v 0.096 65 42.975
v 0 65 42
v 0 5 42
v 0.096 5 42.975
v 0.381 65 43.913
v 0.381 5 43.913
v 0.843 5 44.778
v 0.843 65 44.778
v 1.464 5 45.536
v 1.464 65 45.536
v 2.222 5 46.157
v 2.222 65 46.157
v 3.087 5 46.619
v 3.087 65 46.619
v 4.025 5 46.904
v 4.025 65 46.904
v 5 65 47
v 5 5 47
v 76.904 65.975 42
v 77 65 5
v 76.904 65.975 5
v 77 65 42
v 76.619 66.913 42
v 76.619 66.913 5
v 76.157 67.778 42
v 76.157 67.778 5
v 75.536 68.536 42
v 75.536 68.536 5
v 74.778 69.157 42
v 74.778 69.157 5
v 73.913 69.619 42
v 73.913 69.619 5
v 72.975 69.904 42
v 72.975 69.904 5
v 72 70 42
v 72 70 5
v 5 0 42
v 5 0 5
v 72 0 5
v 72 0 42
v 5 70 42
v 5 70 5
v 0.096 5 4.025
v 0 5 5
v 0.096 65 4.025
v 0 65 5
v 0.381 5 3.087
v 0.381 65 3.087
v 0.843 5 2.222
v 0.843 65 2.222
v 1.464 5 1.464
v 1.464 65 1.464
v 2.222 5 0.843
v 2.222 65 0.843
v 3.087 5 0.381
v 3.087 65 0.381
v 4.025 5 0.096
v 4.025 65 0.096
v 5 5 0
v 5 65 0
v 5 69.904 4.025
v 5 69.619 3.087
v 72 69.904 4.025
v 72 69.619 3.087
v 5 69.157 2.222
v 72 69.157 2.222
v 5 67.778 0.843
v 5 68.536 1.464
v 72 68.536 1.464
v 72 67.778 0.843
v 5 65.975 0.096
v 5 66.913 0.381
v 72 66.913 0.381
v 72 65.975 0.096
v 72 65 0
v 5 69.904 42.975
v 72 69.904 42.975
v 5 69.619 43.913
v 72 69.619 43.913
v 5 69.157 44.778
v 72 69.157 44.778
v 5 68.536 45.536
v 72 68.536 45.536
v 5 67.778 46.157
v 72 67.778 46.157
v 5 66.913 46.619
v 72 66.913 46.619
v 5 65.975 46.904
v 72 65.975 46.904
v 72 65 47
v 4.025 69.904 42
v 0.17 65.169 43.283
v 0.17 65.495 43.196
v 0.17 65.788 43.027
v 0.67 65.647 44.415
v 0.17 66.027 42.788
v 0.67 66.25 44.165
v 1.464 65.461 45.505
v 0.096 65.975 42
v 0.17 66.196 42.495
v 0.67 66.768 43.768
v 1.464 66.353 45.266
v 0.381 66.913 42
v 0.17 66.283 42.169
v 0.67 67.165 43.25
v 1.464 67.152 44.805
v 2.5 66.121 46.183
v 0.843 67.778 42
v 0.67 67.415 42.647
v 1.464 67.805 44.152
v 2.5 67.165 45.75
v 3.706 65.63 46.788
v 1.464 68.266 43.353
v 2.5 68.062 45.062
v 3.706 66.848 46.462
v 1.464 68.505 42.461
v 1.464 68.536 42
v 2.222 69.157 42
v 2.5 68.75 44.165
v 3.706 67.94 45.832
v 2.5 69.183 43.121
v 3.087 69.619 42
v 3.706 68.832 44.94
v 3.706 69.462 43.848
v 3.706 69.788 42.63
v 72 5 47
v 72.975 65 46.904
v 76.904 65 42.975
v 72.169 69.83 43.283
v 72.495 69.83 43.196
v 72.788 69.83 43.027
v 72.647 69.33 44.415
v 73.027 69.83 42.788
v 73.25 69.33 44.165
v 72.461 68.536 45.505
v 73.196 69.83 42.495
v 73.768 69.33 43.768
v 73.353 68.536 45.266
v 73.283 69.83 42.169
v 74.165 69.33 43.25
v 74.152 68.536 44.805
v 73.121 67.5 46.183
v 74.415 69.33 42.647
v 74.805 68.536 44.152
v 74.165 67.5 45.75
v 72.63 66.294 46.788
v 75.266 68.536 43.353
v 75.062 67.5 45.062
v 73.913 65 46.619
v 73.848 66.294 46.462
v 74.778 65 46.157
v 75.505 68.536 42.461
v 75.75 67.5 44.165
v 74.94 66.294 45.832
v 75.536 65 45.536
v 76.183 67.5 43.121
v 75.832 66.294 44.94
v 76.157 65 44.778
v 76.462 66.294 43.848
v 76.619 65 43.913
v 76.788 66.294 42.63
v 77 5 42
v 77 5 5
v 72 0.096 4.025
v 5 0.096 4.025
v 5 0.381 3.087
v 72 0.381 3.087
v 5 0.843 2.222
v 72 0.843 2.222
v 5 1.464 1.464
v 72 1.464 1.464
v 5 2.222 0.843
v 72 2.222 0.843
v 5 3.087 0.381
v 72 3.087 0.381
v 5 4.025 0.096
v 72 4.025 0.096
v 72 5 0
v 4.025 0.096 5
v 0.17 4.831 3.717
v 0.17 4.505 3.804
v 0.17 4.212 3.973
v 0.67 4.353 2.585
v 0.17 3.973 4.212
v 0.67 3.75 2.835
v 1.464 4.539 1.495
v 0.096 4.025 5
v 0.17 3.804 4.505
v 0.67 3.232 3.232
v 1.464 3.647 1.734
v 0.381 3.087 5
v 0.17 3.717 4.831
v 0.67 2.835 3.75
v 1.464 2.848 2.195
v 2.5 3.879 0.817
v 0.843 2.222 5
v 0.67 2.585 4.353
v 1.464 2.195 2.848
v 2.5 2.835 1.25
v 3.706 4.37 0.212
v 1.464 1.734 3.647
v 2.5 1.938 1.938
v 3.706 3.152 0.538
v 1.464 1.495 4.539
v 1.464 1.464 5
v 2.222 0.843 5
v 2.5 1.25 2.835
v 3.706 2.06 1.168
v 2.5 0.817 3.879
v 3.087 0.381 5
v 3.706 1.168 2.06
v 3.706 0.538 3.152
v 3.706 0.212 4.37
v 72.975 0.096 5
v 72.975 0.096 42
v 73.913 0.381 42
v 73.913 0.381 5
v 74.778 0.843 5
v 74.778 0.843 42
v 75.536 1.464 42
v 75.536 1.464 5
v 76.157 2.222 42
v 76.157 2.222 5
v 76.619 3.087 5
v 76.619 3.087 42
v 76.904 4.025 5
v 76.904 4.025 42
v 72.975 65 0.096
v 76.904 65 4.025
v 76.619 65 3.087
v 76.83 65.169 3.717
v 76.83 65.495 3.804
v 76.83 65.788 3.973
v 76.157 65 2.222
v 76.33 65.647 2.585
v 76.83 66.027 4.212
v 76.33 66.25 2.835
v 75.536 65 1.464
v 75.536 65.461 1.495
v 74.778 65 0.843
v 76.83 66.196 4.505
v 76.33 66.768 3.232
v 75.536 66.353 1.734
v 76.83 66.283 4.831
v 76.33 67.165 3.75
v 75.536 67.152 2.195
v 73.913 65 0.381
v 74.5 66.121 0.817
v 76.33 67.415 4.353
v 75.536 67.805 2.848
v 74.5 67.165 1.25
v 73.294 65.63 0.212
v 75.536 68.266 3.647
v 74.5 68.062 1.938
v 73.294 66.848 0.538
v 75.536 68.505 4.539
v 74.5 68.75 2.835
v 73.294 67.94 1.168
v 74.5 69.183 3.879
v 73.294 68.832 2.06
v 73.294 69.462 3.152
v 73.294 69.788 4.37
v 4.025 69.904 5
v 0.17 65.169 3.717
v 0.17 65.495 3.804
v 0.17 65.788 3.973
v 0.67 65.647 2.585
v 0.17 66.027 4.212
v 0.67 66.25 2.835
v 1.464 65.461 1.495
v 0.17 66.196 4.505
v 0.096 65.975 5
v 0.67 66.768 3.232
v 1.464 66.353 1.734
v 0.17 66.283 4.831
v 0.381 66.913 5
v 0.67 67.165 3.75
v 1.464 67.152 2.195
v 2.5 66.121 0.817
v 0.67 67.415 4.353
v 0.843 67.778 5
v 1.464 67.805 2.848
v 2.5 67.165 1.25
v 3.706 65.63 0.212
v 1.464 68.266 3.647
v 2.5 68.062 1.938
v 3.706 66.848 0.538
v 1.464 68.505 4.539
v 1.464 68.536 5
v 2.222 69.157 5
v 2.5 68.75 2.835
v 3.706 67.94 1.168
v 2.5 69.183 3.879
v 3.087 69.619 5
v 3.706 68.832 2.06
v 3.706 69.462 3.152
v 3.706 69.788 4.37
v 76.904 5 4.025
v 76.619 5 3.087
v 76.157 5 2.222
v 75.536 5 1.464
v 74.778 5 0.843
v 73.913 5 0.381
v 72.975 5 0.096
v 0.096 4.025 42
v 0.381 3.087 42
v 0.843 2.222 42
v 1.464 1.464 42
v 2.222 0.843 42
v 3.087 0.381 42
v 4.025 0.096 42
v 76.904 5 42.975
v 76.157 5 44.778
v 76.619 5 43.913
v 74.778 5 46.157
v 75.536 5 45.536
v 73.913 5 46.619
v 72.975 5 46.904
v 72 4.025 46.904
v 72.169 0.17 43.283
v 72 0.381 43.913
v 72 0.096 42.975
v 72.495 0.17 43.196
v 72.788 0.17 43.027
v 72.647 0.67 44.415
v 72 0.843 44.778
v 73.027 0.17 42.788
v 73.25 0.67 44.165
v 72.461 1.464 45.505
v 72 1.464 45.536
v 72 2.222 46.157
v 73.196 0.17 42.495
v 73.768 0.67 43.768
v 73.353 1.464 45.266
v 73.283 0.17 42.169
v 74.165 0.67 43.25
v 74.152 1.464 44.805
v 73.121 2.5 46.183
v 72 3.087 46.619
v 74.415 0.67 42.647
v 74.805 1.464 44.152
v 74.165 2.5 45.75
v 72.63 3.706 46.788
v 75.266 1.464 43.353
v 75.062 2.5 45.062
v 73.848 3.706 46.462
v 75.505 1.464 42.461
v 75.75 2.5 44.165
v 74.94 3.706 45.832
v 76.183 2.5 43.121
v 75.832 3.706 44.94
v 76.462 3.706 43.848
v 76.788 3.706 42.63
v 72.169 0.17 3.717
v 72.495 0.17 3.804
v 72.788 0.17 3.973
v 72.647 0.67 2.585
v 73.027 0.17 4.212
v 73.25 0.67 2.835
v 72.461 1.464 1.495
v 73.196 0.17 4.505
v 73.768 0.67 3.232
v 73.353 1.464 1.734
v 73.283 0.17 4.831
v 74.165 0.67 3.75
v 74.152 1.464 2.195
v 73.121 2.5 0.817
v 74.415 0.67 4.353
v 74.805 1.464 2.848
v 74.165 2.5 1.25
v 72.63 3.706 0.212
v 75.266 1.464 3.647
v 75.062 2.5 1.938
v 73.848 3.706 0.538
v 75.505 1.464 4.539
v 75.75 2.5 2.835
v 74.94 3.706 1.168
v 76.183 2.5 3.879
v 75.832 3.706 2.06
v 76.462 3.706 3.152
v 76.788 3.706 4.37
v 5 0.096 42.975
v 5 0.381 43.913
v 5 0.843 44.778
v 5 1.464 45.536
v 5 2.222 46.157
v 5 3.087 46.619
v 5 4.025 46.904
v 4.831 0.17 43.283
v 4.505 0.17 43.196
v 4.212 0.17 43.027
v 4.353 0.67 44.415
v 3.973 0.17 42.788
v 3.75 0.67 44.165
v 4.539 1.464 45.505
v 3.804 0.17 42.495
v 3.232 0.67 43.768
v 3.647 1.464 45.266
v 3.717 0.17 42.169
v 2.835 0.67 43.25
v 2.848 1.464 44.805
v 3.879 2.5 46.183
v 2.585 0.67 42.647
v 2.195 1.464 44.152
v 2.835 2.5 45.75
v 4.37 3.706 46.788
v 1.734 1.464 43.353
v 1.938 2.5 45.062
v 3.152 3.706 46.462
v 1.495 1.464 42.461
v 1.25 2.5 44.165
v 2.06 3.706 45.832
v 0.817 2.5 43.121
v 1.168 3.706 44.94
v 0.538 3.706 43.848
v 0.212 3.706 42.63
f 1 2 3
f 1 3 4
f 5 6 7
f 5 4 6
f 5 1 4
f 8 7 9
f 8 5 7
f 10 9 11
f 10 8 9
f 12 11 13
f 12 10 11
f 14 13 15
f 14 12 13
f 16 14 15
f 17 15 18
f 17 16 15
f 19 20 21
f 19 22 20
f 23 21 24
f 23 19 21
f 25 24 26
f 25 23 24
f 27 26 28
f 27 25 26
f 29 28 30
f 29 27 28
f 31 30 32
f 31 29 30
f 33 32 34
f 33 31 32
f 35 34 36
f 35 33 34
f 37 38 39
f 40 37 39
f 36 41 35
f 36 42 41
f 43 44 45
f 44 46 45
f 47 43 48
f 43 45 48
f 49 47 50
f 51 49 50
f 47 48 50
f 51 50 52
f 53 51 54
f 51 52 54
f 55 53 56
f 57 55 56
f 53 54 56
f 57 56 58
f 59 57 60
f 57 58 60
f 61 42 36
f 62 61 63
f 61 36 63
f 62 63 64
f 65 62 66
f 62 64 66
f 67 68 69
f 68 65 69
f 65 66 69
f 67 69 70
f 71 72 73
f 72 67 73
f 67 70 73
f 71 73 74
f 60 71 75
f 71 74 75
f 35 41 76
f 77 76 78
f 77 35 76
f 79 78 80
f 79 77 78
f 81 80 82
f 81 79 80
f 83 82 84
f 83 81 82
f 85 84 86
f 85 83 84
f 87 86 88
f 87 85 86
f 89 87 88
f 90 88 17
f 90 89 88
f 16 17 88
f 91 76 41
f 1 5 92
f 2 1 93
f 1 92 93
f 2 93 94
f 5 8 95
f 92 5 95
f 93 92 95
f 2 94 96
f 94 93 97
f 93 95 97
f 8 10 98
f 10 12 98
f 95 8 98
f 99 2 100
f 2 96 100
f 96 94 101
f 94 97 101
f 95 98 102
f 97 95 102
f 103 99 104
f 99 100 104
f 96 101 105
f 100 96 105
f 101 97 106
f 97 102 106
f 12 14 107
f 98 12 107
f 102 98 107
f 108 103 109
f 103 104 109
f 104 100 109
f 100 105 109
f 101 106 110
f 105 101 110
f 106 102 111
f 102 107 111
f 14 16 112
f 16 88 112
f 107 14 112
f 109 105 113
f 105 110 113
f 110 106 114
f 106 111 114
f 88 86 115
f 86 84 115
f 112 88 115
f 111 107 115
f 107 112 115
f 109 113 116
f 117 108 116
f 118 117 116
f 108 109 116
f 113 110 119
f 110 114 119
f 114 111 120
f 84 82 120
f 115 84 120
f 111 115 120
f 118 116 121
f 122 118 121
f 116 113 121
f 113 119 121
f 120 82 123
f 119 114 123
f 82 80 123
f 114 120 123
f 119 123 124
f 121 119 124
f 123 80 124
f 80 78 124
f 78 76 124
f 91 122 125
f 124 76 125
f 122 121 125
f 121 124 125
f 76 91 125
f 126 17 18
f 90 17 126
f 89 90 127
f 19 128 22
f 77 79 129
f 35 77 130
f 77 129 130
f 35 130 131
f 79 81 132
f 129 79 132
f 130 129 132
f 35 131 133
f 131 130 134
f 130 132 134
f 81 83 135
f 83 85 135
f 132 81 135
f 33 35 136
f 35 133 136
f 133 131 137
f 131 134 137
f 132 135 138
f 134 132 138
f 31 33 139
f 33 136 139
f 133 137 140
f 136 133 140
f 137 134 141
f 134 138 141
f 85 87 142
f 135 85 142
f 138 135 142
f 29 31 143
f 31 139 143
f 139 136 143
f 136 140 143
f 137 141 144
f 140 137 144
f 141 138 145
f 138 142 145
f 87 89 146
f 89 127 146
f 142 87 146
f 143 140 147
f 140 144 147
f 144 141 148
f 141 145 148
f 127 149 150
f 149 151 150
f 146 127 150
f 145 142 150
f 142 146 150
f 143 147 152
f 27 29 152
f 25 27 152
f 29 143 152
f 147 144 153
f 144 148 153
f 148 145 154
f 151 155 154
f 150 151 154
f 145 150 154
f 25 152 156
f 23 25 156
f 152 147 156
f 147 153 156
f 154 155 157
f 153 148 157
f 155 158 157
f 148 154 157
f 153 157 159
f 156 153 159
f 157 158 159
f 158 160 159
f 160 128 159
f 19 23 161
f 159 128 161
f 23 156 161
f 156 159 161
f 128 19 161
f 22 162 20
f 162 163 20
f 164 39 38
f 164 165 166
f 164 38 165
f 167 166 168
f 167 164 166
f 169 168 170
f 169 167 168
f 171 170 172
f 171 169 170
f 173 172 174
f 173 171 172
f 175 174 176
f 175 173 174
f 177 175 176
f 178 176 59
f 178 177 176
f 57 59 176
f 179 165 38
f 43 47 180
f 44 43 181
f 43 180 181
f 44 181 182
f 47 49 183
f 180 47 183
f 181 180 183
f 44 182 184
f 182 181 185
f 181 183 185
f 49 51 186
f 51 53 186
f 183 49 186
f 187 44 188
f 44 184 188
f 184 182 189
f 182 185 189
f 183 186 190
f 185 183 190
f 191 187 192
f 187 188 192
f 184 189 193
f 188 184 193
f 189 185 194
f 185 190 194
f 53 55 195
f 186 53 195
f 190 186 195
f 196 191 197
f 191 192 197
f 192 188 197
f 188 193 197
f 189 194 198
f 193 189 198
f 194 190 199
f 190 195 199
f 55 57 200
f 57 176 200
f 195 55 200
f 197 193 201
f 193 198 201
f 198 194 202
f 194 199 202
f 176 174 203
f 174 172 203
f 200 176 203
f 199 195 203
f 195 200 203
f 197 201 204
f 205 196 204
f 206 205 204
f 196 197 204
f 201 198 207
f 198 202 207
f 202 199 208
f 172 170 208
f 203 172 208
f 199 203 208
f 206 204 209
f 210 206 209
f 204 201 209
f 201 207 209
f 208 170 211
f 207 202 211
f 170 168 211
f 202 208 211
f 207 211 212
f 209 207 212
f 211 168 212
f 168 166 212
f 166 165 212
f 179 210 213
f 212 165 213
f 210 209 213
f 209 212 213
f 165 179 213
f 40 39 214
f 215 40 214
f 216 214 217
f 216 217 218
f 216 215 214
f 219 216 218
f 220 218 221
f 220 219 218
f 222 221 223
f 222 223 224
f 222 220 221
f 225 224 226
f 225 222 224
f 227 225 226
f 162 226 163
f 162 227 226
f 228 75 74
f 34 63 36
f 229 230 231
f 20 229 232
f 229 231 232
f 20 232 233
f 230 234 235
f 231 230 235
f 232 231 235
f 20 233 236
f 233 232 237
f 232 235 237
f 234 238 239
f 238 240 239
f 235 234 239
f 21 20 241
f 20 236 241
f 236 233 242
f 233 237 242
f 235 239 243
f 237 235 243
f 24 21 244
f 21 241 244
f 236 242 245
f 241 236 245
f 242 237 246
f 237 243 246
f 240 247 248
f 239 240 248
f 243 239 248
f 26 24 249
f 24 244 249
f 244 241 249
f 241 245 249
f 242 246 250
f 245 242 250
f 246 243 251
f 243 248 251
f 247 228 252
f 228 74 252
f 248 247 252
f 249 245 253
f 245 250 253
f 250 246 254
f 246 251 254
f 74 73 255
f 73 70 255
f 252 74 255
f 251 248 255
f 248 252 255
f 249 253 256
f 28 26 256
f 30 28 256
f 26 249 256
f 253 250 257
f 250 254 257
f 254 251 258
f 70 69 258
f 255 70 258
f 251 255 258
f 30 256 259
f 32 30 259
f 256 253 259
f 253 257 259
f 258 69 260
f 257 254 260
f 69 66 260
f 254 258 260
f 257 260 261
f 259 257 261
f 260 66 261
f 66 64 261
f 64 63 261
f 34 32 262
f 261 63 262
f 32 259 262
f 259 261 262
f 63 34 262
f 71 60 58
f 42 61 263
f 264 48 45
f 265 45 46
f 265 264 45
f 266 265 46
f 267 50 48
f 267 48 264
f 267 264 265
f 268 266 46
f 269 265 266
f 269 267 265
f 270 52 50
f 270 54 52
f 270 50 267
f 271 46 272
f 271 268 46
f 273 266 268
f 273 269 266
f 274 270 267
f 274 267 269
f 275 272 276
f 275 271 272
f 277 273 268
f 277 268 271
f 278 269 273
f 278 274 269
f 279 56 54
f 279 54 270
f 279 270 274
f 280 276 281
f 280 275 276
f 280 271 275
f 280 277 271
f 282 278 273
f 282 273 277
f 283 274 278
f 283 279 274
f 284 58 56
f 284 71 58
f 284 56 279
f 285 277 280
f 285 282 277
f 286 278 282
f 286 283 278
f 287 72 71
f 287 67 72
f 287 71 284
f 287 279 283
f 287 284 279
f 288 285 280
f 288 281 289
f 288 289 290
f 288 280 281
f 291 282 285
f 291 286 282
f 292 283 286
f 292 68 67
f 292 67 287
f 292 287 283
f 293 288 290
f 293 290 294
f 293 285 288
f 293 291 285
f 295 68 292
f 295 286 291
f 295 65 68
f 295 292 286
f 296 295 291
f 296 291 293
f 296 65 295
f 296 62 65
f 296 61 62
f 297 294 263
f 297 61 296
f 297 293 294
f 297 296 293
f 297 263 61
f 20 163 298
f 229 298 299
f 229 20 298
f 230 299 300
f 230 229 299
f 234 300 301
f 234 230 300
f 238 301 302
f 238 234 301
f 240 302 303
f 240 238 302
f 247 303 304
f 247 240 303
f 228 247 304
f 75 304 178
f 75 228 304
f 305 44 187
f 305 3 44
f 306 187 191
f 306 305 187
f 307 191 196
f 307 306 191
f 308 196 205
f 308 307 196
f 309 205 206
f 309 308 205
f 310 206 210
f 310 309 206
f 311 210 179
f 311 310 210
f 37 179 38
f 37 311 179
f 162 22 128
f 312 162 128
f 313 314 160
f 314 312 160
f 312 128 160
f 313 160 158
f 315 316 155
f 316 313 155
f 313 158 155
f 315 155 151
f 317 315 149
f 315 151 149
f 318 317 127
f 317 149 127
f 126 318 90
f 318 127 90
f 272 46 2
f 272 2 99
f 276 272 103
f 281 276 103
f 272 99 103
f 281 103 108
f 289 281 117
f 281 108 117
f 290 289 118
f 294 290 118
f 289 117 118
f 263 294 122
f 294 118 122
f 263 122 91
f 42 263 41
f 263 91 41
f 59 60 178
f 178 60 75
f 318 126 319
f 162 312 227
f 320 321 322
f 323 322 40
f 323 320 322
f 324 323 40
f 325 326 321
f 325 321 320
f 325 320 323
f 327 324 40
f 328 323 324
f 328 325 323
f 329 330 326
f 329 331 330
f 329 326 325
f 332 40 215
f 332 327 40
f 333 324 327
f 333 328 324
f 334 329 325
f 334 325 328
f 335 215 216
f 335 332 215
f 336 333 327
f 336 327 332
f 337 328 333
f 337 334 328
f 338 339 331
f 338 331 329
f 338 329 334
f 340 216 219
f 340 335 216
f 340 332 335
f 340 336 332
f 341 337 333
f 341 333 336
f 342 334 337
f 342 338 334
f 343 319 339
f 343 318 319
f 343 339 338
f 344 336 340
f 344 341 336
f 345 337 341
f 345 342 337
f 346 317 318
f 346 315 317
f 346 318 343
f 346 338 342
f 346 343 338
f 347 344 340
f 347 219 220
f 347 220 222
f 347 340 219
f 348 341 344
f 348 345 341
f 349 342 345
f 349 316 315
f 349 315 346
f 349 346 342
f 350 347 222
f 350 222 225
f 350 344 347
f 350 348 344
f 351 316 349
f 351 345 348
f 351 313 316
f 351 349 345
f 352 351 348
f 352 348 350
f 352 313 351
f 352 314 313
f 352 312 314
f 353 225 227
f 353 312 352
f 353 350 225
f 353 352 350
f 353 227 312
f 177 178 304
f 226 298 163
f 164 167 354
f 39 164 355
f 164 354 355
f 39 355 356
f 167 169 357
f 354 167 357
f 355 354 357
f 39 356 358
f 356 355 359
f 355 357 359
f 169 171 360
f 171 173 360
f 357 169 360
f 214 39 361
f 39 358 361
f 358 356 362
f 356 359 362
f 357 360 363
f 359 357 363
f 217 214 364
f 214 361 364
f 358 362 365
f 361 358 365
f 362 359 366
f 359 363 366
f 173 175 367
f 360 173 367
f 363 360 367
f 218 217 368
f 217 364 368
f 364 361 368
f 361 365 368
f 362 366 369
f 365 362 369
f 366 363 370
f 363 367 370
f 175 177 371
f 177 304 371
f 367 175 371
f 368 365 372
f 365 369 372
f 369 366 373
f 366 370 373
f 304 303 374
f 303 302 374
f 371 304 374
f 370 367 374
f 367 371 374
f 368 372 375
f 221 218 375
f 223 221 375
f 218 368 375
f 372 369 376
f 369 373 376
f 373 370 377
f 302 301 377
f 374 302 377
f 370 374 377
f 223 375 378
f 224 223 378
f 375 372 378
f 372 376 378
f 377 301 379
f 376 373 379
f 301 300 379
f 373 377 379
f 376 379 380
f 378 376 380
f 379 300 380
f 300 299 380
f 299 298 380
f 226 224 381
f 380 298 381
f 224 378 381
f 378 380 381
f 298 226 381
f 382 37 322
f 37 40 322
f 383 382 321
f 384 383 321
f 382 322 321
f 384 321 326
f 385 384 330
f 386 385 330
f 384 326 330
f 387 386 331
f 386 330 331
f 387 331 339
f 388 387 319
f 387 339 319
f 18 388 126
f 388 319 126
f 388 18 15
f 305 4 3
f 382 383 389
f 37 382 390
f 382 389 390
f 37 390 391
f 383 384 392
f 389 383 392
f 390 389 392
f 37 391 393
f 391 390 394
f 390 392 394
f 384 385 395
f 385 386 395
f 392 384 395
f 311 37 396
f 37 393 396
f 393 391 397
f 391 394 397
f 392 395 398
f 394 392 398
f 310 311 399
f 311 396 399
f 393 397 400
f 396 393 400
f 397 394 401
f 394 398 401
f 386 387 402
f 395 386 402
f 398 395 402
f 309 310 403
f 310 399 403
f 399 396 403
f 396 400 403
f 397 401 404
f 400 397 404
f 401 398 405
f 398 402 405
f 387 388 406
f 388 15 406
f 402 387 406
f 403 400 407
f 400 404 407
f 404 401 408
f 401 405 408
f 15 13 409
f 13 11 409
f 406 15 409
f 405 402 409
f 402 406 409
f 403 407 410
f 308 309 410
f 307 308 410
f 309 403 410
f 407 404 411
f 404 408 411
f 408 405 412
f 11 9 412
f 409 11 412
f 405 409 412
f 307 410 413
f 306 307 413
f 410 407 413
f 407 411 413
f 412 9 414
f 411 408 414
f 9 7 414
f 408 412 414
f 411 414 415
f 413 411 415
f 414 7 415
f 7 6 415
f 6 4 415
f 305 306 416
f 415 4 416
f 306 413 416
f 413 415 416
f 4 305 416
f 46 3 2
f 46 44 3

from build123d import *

# Parameters (mm, degrees)
CROQUIS1_W              = 77
CROQUIS1_H              = 70
SALIENTE_EXTRUIR1_DEPTH = 47
REDONDEO1_R             = 5


with BuildPart() as part:
    # Croquis1 → Saliente-Extruir1 (new body)
    with BuildSketch(Plane.XY):
        with Locations((38.5, 35)):
            Rectangle(CROQUIS1_W, CROQUIS1_H)
    extrude(amount=SALIENTE_EXTRUIR1_DEPTH)

    # Redondeo1
    redondeo1_edges = [part.edges().sort_by_distance(p)[0] for p in [
        (77, 35, 47),
        (38.5, 70, 47),
        (0, 35, 47),
        (38.5, 70, 0),
        (77, 35, 0),
        (38.5, 0, 0),
        (0, 35, 0),
        (38.5, 0, 47),
        (0, 70, 23.5),
        (77, 70, 23.5),
        (77, 0, 23.5),
        (0, 0, 23.5),
    ]]
    fillet(redondeo1_edges, radius=REDONDEO1_R)


solid = part.part
